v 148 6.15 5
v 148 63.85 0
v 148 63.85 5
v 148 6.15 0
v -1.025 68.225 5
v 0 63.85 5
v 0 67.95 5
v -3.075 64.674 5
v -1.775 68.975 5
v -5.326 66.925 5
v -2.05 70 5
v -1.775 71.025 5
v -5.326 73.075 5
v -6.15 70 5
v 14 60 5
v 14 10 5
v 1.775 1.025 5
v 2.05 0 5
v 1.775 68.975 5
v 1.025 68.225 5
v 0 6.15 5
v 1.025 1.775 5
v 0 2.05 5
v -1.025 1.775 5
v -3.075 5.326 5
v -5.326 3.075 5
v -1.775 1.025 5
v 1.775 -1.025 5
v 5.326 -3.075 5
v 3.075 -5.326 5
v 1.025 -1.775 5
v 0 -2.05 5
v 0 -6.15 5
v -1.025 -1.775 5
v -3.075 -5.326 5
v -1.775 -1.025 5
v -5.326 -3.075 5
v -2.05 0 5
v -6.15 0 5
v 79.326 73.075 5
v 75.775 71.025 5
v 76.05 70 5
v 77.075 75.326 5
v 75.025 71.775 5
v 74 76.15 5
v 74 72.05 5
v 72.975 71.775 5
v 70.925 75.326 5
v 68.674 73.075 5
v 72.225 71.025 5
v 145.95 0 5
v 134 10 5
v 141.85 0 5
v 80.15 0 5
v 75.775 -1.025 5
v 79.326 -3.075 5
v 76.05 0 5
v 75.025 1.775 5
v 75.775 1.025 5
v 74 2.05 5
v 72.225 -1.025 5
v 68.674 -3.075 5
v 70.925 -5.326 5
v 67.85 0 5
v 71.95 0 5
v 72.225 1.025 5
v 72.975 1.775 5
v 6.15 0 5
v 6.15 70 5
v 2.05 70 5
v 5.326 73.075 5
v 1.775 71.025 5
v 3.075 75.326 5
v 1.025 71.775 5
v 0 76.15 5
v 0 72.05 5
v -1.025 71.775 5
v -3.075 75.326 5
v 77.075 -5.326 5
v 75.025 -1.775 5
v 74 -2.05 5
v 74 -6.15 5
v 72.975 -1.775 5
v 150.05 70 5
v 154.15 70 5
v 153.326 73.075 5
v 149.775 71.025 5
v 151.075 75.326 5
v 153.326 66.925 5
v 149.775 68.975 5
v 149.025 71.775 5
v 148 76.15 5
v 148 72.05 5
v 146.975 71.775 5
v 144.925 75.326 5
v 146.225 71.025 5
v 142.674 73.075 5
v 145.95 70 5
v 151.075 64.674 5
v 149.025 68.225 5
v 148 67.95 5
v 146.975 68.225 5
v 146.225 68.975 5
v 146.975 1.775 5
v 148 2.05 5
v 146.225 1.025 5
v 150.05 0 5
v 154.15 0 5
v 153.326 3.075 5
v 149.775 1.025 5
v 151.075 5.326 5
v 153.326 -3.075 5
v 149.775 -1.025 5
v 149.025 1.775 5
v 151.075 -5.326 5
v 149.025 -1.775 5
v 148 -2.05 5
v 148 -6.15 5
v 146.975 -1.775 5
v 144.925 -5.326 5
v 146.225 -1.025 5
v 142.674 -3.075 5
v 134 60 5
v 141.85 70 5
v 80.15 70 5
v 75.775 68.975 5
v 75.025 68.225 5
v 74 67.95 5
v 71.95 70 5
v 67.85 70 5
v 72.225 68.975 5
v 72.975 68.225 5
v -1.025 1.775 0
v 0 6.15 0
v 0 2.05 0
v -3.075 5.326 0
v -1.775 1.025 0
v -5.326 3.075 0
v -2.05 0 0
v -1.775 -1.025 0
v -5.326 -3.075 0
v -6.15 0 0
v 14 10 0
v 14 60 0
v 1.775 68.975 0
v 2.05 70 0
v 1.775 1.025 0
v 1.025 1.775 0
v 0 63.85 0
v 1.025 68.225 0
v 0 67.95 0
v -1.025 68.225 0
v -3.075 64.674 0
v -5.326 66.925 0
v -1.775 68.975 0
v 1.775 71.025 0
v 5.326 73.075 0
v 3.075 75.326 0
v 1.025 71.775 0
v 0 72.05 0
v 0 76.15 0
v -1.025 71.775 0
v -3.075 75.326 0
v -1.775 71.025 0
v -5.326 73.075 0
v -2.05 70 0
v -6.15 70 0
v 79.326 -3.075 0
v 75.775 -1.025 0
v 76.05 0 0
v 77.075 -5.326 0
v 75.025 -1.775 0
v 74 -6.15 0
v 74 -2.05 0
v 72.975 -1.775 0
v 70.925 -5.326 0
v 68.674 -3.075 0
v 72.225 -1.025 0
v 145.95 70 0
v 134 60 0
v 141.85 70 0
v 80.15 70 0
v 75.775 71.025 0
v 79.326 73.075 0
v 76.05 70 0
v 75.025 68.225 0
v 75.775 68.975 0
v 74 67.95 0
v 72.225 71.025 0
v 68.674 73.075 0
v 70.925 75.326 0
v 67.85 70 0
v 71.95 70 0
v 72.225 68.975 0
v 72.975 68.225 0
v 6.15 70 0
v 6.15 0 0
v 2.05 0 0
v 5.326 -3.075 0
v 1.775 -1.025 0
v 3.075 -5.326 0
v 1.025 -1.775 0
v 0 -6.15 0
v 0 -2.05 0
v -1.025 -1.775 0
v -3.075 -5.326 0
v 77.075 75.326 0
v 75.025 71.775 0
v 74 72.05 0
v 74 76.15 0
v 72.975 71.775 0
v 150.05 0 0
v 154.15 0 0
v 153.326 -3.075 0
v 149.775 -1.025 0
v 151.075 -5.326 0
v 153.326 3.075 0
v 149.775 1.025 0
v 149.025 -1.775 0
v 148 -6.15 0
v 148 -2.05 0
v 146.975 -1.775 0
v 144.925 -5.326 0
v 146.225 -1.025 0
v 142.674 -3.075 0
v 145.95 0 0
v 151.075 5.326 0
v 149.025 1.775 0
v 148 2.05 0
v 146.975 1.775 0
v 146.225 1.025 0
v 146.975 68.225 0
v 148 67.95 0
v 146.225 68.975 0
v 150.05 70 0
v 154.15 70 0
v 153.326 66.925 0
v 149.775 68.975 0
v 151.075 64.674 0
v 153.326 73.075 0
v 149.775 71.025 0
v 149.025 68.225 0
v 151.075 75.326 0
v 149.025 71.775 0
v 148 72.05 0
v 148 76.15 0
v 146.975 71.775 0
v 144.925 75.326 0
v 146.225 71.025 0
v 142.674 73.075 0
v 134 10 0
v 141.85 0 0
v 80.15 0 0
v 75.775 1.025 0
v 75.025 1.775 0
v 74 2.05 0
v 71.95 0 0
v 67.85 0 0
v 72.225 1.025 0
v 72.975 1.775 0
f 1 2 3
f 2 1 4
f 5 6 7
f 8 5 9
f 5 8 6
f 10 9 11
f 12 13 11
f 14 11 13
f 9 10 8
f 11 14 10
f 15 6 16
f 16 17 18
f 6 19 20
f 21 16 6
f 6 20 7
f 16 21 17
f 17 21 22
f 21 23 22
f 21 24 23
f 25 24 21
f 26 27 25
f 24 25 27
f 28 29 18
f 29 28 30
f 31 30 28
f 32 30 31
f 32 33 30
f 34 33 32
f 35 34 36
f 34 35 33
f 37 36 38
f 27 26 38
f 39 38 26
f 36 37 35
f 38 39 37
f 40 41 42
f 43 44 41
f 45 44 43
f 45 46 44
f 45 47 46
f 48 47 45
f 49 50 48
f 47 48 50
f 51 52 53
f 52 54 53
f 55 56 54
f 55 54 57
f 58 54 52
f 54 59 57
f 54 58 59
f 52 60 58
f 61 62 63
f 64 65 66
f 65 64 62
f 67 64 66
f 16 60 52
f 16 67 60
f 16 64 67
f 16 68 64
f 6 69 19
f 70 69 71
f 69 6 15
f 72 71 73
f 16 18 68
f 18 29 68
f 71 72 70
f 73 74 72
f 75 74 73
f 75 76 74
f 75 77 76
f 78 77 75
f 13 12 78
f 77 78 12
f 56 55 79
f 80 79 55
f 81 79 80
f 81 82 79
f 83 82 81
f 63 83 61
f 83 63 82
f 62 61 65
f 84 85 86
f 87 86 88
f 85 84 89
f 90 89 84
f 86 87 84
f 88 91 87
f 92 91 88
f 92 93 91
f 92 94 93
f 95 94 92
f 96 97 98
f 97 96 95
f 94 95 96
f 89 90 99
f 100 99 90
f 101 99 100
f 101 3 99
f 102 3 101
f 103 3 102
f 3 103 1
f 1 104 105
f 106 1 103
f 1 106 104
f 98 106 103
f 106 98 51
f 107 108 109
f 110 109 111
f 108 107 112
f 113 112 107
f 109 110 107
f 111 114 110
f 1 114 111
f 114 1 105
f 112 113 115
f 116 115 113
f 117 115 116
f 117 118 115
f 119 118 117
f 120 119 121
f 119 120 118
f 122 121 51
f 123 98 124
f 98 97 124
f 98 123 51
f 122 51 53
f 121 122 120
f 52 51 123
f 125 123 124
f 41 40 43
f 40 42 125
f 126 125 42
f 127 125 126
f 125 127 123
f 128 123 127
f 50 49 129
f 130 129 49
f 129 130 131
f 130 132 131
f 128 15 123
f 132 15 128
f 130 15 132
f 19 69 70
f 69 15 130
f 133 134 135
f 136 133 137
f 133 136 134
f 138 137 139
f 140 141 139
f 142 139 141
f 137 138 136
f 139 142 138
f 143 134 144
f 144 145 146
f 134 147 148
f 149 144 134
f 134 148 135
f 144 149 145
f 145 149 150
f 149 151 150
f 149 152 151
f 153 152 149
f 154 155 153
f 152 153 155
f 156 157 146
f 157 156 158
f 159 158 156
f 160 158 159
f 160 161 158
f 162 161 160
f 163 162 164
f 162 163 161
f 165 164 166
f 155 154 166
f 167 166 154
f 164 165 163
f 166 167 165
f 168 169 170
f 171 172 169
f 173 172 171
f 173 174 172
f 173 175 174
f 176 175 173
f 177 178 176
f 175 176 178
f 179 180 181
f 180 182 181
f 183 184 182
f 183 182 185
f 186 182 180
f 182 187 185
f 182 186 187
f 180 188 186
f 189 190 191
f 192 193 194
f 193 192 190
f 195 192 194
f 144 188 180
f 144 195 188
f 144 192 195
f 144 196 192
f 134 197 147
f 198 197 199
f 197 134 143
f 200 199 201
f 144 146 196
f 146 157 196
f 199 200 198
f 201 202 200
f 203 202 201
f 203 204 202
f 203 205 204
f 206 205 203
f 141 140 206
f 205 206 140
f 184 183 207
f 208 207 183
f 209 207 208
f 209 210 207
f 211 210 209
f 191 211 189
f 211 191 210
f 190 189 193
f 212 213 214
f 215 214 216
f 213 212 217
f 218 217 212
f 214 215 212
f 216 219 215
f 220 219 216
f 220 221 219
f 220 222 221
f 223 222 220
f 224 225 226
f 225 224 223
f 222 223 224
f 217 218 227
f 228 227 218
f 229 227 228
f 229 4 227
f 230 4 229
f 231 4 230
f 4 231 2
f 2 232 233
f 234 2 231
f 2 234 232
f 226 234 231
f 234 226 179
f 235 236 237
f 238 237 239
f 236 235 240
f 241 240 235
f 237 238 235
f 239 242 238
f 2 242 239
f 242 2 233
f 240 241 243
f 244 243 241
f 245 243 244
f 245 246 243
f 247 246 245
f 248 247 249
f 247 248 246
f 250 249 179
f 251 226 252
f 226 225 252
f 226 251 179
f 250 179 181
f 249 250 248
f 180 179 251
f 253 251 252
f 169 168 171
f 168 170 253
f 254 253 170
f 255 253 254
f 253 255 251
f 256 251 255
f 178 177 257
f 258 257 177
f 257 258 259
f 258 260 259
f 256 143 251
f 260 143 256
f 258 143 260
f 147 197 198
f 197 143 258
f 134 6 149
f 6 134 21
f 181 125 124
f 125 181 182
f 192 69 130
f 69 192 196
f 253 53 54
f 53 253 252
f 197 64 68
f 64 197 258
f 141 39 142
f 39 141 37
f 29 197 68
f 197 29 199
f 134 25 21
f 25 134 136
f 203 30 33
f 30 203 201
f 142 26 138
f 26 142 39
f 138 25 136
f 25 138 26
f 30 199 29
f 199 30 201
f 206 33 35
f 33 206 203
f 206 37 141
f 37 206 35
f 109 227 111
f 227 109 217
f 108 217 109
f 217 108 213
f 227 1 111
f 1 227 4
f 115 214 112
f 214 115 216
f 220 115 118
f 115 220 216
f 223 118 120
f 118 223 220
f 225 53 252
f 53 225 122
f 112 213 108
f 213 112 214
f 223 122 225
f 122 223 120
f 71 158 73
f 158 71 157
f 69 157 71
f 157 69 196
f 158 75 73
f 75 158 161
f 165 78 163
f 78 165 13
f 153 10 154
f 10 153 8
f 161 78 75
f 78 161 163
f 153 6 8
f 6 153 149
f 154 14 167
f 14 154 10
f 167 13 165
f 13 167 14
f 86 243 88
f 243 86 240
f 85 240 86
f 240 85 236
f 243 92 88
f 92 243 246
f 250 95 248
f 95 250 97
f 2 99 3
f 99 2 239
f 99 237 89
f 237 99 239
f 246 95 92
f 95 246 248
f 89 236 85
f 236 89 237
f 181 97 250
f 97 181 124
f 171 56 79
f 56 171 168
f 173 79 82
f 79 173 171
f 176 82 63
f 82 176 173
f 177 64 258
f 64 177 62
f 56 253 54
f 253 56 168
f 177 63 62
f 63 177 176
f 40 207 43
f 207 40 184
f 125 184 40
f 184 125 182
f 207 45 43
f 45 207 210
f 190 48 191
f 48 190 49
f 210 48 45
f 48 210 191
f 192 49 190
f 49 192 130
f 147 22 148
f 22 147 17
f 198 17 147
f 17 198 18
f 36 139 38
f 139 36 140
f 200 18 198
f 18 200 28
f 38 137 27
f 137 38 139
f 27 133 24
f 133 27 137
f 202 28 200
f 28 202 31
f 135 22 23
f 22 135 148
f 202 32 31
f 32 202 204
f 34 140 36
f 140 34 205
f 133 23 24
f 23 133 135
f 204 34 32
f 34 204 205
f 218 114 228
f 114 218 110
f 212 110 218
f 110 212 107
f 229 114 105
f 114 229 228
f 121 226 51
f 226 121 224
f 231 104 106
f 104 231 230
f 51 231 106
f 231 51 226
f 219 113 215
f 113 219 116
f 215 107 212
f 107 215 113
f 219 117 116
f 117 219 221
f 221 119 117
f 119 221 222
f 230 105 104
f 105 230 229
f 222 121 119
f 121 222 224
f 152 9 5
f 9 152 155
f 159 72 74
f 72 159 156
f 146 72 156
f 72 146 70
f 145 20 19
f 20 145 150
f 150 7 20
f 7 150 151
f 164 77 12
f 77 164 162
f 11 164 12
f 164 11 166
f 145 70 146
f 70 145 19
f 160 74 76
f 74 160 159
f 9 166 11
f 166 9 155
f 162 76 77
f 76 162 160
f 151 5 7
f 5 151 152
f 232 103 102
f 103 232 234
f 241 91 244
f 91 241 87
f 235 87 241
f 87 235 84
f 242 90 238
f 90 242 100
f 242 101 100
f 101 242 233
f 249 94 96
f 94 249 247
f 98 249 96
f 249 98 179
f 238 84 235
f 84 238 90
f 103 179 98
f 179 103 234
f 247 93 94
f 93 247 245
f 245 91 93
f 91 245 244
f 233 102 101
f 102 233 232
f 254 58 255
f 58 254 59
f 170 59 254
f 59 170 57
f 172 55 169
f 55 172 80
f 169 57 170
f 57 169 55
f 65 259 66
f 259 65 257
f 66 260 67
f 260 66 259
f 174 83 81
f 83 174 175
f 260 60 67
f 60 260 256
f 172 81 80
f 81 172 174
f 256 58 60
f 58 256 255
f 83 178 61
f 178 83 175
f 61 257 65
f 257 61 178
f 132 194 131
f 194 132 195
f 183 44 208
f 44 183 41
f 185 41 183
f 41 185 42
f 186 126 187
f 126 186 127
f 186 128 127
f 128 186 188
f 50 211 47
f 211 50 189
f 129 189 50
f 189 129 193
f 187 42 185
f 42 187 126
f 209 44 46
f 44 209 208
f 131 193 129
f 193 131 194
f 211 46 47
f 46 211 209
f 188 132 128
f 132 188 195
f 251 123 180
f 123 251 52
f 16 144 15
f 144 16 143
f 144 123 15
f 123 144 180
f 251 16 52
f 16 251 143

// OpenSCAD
/* This is a jig for holding the rpi door controller PCB
   on a Sherline 5000 mill for isolation milling.  */

$fn = 12;

/* Set overall piece dimensions. */
x = 148;
y = 70;
z = 5;
x_border = 14;
y_border = 10;

/* Set the screw size in mm. */
screw_size = 4.1;


difference() {

   union() {
      cube([x, y, z]);
   
      cylinder(h = z, r = screw_size * 1.5);
      translate([x, 0, 0]) cylinder(h = z, r = screw_size * 1.5);
      translate([0, y, 0]) cylinder(h = z, r = screw_size * 1.5);
      translate([x, y, 0]) cylinder(h = z, r = screw_size * 1.5);
      translate([x / 2, 0, 0]) cylinder(h = z, r = screw_size * 1.5);
      translate([x / 2, y, 0]) cylinder(h = z, r = screw_size * 1.5);
   } /* endunion */
   
   cylinder(h = z, r = screw_size / 2);
   translate([x, 0, 0]) cylinder(h = z, r = screw_size / 2);
   translate([0, y, 0]) cylinder(h = z, r = screw_size / 2);
   translate([x, y, 0]) cylinder(h = z, r = screw_size / 2);
   translate([x / 2, 0, 0]) cylinder(h = z, r = screw_size / 2);
   translate([x / 2, y, 0]) cylinder(h = z, r = screw_size / 2);

   /* Make a big hole in the center. */
   translate([x_border, y_border, 0])
      cube([x - (2 * x_border), y - (2 * y_border), z]); 


} /* enddifference */
